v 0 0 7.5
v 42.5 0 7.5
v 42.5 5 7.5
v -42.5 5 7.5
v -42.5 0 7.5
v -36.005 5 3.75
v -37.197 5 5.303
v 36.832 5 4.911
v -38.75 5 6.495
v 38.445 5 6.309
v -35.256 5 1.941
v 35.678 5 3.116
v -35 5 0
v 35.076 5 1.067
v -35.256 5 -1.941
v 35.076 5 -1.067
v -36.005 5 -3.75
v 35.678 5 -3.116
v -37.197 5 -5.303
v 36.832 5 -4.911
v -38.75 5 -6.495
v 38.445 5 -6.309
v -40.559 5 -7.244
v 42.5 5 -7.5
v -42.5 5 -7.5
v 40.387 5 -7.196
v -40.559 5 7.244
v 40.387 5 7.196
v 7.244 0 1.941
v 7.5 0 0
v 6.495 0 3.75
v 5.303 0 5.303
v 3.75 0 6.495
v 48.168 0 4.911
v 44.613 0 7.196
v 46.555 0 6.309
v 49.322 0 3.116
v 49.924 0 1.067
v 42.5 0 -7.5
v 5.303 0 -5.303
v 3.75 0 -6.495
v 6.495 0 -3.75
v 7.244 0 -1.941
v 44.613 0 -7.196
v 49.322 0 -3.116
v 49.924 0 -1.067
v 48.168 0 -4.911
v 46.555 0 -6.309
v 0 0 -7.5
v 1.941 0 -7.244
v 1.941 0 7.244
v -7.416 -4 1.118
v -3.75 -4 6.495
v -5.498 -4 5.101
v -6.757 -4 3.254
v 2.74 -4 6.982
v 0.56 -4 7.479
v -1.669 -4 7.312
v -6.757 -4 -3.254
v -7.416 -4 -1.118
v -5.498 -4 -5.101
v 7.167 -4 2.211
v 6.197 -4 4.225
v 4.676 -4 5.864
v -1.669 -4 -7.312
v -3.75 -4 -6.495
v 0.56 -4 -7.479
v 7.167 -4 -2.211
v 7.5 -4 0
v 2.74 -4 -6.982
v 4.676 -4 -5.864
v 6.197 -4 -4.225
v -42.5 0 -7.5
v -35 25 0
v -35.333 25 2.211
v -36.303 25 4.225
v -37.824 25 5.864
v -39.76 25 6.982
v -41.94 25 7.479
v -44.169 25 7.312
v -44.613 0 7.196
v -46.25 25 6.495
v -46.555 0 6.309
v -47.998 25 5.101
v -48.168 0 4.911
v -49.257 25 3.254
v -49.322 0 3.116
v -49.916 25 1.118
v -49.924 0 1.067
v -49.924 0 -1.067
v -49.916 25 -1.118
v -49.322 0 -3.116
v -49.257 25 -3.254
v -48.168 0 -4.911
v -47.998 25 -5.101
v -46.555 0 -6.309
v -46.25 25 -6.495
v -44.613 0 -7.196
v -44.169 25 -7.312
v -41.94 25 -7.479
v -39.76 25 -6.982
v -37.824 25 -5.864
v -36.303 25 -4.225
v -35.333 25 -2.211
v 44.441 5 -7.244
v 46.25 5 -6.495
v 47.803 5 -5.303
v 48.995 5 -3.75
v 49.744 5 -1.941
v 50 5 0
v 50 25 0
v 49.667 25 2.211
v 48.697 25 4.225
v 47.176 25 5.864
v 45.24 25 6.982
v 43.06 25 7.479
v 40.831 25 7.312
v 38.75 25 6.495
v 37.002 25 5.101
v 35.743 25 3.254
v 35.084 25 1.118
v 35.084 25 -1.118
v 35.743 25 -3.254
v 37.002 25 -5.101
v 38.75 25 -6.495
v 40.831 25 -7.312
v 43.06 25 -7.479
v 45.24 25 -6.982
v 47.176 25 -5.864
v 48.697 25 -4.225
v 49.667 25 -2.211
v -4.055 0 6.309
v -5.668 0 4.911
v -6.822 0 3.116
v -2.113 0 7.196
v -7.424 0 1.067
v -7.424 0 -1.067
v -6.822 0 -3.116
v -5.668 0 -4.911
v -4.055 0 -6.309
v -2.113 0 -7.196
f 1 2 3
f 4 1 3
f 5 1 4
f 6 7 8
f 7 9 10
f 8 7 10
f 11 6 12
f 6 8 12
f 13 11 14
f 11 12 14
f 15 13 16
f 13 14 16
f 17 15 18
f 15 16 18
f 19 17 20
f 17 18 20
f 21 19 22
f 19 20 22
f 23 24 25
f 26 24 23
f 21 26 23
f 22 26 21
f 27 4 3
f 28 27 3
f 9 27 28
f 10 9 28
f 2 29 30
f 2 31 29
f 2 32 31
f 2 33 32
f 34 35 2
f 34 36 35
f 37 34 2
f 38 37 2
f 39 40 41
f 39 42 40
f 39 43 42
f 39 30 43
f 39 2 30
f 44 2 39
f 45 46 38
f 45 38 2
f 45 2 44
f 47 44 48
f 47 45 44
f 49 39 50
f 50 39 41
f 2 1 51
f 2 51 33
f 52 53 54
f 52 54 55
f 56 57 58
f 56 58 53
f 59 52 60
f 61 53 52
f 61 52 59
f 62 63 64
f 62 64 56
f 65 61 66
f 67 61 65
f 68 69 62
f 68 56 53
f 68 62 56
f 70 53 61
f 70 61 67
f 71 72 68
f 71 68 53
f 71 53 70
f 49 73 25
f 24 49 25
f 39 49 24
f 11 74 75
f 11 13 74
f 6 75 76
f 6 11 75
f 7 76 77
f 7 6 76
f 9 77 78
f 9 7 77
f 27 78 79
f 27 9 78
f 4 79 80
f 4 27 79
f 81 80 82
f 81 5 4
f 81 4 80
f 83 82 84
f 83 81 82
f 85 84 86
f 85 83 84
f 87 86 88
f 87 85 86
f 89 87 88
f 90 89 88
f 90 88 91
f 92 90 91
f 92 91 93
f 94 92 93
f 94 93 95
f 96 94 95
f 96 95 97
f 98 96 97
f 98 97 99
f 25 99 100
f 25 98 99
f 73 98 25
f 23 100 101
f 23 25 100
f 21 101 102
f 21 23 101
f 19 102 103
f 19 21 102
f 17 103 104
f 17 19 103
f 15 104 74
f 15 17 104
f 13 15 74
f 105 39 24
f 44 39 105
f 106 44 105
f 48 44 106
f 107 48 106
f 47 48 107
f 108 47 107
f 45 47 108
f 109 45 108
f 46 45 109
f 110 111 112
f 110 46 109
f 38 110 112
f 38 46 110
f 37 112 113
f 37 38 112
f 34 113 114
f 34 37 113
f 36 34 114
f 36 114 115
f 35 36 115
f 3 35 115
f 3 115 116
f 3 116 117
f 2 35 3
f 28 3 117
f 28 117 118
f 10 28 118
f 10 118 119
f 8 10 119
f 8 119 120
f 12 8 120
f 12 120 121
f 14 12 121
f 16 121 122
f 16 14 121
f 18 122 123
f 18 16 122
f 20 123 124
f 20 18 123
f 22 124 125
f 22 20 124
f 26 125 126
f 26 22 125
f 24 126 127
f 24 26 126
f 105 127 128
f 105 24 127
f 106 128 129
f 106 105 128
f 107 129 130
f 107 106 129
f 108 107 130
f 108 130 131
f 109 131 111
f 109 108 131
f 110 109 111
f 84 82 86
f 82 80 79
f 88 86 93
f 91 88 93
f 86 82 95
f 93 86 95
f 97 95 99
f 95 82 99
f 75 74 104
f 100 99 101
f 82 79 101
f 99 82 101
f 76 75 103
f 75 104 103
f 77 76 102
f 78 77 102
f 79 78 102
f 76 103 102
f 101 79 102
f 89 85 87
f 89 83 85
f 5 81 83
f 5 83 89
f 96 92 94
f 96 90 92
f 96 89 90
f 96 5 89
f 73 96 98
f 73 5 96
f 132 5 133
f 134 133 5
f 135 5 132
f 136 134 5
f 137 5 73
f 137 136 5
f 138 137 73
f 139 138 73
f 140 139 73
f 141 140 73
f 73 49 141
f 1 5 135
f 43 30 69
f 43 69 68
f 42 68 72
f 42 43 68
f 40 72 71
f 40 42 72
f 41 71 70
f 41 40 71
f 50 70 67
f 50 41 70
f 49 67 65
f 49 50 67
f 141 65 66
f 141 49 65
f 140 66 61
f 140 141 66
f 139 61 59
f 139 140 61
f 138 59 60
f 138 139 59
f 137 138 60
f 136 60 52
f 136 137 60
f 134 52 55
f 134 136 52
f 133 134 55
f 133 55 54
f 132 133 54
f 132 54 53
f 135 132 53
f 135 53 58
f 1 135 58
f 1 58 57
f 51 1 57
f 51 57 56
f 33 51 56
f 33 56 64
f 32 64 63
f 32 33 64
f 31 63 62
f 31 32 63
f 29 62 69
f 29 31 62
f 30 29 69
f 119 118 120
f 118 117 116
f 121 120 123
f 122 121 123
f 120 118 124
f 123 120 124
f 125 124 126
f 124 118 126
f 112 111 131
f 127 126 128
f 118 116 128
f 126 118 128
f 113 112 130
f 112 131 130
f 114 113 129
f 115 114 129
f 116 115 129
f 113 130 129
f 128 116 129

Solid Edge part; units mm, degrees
sketch "Sketch1" plane through (0, 0, 0) normal (0, -1, 0) x (1, 0, 0)
  line L0 (-42.5, -7.5) -> (42.5, -7.5)
  line L1 (42.5, 7.5) -> (-42.5, 7.5)
  arc A0 (42.5, 7.5) -> (42.5, -7.5) centre (42.5, 0) cw
  arc A1 (-42.5, -7.5) -> (-42.5, 7.5) centre (-42.5, 0) cw
extrude "Protrusion1" add sketch "Sketch1" against normal blind 5
sketch "Sketch2" plane through (0, 0, 0) normal (0, -1, 0) x (1, 0, 0)
  circle A0 centre (-42.5, 0) radius 7.5
  circle A1 centre (42.5, 0) radius 7.5
  dimension "D1" = 15
extrude "ExtrudedProtrusion_3" add sketch "Sketch2" against normal blind 25
sketch "Sketch3" plane through (0, 0, 0) normal (0, -1, 0) x (1, 0, 0)
  circle A0 centre (0, 0) radius 7.5
extrude "ExtrudedProtrusion_5" add sketch "Sketch3" along normal blind 4
properties material "Stainless steel"
